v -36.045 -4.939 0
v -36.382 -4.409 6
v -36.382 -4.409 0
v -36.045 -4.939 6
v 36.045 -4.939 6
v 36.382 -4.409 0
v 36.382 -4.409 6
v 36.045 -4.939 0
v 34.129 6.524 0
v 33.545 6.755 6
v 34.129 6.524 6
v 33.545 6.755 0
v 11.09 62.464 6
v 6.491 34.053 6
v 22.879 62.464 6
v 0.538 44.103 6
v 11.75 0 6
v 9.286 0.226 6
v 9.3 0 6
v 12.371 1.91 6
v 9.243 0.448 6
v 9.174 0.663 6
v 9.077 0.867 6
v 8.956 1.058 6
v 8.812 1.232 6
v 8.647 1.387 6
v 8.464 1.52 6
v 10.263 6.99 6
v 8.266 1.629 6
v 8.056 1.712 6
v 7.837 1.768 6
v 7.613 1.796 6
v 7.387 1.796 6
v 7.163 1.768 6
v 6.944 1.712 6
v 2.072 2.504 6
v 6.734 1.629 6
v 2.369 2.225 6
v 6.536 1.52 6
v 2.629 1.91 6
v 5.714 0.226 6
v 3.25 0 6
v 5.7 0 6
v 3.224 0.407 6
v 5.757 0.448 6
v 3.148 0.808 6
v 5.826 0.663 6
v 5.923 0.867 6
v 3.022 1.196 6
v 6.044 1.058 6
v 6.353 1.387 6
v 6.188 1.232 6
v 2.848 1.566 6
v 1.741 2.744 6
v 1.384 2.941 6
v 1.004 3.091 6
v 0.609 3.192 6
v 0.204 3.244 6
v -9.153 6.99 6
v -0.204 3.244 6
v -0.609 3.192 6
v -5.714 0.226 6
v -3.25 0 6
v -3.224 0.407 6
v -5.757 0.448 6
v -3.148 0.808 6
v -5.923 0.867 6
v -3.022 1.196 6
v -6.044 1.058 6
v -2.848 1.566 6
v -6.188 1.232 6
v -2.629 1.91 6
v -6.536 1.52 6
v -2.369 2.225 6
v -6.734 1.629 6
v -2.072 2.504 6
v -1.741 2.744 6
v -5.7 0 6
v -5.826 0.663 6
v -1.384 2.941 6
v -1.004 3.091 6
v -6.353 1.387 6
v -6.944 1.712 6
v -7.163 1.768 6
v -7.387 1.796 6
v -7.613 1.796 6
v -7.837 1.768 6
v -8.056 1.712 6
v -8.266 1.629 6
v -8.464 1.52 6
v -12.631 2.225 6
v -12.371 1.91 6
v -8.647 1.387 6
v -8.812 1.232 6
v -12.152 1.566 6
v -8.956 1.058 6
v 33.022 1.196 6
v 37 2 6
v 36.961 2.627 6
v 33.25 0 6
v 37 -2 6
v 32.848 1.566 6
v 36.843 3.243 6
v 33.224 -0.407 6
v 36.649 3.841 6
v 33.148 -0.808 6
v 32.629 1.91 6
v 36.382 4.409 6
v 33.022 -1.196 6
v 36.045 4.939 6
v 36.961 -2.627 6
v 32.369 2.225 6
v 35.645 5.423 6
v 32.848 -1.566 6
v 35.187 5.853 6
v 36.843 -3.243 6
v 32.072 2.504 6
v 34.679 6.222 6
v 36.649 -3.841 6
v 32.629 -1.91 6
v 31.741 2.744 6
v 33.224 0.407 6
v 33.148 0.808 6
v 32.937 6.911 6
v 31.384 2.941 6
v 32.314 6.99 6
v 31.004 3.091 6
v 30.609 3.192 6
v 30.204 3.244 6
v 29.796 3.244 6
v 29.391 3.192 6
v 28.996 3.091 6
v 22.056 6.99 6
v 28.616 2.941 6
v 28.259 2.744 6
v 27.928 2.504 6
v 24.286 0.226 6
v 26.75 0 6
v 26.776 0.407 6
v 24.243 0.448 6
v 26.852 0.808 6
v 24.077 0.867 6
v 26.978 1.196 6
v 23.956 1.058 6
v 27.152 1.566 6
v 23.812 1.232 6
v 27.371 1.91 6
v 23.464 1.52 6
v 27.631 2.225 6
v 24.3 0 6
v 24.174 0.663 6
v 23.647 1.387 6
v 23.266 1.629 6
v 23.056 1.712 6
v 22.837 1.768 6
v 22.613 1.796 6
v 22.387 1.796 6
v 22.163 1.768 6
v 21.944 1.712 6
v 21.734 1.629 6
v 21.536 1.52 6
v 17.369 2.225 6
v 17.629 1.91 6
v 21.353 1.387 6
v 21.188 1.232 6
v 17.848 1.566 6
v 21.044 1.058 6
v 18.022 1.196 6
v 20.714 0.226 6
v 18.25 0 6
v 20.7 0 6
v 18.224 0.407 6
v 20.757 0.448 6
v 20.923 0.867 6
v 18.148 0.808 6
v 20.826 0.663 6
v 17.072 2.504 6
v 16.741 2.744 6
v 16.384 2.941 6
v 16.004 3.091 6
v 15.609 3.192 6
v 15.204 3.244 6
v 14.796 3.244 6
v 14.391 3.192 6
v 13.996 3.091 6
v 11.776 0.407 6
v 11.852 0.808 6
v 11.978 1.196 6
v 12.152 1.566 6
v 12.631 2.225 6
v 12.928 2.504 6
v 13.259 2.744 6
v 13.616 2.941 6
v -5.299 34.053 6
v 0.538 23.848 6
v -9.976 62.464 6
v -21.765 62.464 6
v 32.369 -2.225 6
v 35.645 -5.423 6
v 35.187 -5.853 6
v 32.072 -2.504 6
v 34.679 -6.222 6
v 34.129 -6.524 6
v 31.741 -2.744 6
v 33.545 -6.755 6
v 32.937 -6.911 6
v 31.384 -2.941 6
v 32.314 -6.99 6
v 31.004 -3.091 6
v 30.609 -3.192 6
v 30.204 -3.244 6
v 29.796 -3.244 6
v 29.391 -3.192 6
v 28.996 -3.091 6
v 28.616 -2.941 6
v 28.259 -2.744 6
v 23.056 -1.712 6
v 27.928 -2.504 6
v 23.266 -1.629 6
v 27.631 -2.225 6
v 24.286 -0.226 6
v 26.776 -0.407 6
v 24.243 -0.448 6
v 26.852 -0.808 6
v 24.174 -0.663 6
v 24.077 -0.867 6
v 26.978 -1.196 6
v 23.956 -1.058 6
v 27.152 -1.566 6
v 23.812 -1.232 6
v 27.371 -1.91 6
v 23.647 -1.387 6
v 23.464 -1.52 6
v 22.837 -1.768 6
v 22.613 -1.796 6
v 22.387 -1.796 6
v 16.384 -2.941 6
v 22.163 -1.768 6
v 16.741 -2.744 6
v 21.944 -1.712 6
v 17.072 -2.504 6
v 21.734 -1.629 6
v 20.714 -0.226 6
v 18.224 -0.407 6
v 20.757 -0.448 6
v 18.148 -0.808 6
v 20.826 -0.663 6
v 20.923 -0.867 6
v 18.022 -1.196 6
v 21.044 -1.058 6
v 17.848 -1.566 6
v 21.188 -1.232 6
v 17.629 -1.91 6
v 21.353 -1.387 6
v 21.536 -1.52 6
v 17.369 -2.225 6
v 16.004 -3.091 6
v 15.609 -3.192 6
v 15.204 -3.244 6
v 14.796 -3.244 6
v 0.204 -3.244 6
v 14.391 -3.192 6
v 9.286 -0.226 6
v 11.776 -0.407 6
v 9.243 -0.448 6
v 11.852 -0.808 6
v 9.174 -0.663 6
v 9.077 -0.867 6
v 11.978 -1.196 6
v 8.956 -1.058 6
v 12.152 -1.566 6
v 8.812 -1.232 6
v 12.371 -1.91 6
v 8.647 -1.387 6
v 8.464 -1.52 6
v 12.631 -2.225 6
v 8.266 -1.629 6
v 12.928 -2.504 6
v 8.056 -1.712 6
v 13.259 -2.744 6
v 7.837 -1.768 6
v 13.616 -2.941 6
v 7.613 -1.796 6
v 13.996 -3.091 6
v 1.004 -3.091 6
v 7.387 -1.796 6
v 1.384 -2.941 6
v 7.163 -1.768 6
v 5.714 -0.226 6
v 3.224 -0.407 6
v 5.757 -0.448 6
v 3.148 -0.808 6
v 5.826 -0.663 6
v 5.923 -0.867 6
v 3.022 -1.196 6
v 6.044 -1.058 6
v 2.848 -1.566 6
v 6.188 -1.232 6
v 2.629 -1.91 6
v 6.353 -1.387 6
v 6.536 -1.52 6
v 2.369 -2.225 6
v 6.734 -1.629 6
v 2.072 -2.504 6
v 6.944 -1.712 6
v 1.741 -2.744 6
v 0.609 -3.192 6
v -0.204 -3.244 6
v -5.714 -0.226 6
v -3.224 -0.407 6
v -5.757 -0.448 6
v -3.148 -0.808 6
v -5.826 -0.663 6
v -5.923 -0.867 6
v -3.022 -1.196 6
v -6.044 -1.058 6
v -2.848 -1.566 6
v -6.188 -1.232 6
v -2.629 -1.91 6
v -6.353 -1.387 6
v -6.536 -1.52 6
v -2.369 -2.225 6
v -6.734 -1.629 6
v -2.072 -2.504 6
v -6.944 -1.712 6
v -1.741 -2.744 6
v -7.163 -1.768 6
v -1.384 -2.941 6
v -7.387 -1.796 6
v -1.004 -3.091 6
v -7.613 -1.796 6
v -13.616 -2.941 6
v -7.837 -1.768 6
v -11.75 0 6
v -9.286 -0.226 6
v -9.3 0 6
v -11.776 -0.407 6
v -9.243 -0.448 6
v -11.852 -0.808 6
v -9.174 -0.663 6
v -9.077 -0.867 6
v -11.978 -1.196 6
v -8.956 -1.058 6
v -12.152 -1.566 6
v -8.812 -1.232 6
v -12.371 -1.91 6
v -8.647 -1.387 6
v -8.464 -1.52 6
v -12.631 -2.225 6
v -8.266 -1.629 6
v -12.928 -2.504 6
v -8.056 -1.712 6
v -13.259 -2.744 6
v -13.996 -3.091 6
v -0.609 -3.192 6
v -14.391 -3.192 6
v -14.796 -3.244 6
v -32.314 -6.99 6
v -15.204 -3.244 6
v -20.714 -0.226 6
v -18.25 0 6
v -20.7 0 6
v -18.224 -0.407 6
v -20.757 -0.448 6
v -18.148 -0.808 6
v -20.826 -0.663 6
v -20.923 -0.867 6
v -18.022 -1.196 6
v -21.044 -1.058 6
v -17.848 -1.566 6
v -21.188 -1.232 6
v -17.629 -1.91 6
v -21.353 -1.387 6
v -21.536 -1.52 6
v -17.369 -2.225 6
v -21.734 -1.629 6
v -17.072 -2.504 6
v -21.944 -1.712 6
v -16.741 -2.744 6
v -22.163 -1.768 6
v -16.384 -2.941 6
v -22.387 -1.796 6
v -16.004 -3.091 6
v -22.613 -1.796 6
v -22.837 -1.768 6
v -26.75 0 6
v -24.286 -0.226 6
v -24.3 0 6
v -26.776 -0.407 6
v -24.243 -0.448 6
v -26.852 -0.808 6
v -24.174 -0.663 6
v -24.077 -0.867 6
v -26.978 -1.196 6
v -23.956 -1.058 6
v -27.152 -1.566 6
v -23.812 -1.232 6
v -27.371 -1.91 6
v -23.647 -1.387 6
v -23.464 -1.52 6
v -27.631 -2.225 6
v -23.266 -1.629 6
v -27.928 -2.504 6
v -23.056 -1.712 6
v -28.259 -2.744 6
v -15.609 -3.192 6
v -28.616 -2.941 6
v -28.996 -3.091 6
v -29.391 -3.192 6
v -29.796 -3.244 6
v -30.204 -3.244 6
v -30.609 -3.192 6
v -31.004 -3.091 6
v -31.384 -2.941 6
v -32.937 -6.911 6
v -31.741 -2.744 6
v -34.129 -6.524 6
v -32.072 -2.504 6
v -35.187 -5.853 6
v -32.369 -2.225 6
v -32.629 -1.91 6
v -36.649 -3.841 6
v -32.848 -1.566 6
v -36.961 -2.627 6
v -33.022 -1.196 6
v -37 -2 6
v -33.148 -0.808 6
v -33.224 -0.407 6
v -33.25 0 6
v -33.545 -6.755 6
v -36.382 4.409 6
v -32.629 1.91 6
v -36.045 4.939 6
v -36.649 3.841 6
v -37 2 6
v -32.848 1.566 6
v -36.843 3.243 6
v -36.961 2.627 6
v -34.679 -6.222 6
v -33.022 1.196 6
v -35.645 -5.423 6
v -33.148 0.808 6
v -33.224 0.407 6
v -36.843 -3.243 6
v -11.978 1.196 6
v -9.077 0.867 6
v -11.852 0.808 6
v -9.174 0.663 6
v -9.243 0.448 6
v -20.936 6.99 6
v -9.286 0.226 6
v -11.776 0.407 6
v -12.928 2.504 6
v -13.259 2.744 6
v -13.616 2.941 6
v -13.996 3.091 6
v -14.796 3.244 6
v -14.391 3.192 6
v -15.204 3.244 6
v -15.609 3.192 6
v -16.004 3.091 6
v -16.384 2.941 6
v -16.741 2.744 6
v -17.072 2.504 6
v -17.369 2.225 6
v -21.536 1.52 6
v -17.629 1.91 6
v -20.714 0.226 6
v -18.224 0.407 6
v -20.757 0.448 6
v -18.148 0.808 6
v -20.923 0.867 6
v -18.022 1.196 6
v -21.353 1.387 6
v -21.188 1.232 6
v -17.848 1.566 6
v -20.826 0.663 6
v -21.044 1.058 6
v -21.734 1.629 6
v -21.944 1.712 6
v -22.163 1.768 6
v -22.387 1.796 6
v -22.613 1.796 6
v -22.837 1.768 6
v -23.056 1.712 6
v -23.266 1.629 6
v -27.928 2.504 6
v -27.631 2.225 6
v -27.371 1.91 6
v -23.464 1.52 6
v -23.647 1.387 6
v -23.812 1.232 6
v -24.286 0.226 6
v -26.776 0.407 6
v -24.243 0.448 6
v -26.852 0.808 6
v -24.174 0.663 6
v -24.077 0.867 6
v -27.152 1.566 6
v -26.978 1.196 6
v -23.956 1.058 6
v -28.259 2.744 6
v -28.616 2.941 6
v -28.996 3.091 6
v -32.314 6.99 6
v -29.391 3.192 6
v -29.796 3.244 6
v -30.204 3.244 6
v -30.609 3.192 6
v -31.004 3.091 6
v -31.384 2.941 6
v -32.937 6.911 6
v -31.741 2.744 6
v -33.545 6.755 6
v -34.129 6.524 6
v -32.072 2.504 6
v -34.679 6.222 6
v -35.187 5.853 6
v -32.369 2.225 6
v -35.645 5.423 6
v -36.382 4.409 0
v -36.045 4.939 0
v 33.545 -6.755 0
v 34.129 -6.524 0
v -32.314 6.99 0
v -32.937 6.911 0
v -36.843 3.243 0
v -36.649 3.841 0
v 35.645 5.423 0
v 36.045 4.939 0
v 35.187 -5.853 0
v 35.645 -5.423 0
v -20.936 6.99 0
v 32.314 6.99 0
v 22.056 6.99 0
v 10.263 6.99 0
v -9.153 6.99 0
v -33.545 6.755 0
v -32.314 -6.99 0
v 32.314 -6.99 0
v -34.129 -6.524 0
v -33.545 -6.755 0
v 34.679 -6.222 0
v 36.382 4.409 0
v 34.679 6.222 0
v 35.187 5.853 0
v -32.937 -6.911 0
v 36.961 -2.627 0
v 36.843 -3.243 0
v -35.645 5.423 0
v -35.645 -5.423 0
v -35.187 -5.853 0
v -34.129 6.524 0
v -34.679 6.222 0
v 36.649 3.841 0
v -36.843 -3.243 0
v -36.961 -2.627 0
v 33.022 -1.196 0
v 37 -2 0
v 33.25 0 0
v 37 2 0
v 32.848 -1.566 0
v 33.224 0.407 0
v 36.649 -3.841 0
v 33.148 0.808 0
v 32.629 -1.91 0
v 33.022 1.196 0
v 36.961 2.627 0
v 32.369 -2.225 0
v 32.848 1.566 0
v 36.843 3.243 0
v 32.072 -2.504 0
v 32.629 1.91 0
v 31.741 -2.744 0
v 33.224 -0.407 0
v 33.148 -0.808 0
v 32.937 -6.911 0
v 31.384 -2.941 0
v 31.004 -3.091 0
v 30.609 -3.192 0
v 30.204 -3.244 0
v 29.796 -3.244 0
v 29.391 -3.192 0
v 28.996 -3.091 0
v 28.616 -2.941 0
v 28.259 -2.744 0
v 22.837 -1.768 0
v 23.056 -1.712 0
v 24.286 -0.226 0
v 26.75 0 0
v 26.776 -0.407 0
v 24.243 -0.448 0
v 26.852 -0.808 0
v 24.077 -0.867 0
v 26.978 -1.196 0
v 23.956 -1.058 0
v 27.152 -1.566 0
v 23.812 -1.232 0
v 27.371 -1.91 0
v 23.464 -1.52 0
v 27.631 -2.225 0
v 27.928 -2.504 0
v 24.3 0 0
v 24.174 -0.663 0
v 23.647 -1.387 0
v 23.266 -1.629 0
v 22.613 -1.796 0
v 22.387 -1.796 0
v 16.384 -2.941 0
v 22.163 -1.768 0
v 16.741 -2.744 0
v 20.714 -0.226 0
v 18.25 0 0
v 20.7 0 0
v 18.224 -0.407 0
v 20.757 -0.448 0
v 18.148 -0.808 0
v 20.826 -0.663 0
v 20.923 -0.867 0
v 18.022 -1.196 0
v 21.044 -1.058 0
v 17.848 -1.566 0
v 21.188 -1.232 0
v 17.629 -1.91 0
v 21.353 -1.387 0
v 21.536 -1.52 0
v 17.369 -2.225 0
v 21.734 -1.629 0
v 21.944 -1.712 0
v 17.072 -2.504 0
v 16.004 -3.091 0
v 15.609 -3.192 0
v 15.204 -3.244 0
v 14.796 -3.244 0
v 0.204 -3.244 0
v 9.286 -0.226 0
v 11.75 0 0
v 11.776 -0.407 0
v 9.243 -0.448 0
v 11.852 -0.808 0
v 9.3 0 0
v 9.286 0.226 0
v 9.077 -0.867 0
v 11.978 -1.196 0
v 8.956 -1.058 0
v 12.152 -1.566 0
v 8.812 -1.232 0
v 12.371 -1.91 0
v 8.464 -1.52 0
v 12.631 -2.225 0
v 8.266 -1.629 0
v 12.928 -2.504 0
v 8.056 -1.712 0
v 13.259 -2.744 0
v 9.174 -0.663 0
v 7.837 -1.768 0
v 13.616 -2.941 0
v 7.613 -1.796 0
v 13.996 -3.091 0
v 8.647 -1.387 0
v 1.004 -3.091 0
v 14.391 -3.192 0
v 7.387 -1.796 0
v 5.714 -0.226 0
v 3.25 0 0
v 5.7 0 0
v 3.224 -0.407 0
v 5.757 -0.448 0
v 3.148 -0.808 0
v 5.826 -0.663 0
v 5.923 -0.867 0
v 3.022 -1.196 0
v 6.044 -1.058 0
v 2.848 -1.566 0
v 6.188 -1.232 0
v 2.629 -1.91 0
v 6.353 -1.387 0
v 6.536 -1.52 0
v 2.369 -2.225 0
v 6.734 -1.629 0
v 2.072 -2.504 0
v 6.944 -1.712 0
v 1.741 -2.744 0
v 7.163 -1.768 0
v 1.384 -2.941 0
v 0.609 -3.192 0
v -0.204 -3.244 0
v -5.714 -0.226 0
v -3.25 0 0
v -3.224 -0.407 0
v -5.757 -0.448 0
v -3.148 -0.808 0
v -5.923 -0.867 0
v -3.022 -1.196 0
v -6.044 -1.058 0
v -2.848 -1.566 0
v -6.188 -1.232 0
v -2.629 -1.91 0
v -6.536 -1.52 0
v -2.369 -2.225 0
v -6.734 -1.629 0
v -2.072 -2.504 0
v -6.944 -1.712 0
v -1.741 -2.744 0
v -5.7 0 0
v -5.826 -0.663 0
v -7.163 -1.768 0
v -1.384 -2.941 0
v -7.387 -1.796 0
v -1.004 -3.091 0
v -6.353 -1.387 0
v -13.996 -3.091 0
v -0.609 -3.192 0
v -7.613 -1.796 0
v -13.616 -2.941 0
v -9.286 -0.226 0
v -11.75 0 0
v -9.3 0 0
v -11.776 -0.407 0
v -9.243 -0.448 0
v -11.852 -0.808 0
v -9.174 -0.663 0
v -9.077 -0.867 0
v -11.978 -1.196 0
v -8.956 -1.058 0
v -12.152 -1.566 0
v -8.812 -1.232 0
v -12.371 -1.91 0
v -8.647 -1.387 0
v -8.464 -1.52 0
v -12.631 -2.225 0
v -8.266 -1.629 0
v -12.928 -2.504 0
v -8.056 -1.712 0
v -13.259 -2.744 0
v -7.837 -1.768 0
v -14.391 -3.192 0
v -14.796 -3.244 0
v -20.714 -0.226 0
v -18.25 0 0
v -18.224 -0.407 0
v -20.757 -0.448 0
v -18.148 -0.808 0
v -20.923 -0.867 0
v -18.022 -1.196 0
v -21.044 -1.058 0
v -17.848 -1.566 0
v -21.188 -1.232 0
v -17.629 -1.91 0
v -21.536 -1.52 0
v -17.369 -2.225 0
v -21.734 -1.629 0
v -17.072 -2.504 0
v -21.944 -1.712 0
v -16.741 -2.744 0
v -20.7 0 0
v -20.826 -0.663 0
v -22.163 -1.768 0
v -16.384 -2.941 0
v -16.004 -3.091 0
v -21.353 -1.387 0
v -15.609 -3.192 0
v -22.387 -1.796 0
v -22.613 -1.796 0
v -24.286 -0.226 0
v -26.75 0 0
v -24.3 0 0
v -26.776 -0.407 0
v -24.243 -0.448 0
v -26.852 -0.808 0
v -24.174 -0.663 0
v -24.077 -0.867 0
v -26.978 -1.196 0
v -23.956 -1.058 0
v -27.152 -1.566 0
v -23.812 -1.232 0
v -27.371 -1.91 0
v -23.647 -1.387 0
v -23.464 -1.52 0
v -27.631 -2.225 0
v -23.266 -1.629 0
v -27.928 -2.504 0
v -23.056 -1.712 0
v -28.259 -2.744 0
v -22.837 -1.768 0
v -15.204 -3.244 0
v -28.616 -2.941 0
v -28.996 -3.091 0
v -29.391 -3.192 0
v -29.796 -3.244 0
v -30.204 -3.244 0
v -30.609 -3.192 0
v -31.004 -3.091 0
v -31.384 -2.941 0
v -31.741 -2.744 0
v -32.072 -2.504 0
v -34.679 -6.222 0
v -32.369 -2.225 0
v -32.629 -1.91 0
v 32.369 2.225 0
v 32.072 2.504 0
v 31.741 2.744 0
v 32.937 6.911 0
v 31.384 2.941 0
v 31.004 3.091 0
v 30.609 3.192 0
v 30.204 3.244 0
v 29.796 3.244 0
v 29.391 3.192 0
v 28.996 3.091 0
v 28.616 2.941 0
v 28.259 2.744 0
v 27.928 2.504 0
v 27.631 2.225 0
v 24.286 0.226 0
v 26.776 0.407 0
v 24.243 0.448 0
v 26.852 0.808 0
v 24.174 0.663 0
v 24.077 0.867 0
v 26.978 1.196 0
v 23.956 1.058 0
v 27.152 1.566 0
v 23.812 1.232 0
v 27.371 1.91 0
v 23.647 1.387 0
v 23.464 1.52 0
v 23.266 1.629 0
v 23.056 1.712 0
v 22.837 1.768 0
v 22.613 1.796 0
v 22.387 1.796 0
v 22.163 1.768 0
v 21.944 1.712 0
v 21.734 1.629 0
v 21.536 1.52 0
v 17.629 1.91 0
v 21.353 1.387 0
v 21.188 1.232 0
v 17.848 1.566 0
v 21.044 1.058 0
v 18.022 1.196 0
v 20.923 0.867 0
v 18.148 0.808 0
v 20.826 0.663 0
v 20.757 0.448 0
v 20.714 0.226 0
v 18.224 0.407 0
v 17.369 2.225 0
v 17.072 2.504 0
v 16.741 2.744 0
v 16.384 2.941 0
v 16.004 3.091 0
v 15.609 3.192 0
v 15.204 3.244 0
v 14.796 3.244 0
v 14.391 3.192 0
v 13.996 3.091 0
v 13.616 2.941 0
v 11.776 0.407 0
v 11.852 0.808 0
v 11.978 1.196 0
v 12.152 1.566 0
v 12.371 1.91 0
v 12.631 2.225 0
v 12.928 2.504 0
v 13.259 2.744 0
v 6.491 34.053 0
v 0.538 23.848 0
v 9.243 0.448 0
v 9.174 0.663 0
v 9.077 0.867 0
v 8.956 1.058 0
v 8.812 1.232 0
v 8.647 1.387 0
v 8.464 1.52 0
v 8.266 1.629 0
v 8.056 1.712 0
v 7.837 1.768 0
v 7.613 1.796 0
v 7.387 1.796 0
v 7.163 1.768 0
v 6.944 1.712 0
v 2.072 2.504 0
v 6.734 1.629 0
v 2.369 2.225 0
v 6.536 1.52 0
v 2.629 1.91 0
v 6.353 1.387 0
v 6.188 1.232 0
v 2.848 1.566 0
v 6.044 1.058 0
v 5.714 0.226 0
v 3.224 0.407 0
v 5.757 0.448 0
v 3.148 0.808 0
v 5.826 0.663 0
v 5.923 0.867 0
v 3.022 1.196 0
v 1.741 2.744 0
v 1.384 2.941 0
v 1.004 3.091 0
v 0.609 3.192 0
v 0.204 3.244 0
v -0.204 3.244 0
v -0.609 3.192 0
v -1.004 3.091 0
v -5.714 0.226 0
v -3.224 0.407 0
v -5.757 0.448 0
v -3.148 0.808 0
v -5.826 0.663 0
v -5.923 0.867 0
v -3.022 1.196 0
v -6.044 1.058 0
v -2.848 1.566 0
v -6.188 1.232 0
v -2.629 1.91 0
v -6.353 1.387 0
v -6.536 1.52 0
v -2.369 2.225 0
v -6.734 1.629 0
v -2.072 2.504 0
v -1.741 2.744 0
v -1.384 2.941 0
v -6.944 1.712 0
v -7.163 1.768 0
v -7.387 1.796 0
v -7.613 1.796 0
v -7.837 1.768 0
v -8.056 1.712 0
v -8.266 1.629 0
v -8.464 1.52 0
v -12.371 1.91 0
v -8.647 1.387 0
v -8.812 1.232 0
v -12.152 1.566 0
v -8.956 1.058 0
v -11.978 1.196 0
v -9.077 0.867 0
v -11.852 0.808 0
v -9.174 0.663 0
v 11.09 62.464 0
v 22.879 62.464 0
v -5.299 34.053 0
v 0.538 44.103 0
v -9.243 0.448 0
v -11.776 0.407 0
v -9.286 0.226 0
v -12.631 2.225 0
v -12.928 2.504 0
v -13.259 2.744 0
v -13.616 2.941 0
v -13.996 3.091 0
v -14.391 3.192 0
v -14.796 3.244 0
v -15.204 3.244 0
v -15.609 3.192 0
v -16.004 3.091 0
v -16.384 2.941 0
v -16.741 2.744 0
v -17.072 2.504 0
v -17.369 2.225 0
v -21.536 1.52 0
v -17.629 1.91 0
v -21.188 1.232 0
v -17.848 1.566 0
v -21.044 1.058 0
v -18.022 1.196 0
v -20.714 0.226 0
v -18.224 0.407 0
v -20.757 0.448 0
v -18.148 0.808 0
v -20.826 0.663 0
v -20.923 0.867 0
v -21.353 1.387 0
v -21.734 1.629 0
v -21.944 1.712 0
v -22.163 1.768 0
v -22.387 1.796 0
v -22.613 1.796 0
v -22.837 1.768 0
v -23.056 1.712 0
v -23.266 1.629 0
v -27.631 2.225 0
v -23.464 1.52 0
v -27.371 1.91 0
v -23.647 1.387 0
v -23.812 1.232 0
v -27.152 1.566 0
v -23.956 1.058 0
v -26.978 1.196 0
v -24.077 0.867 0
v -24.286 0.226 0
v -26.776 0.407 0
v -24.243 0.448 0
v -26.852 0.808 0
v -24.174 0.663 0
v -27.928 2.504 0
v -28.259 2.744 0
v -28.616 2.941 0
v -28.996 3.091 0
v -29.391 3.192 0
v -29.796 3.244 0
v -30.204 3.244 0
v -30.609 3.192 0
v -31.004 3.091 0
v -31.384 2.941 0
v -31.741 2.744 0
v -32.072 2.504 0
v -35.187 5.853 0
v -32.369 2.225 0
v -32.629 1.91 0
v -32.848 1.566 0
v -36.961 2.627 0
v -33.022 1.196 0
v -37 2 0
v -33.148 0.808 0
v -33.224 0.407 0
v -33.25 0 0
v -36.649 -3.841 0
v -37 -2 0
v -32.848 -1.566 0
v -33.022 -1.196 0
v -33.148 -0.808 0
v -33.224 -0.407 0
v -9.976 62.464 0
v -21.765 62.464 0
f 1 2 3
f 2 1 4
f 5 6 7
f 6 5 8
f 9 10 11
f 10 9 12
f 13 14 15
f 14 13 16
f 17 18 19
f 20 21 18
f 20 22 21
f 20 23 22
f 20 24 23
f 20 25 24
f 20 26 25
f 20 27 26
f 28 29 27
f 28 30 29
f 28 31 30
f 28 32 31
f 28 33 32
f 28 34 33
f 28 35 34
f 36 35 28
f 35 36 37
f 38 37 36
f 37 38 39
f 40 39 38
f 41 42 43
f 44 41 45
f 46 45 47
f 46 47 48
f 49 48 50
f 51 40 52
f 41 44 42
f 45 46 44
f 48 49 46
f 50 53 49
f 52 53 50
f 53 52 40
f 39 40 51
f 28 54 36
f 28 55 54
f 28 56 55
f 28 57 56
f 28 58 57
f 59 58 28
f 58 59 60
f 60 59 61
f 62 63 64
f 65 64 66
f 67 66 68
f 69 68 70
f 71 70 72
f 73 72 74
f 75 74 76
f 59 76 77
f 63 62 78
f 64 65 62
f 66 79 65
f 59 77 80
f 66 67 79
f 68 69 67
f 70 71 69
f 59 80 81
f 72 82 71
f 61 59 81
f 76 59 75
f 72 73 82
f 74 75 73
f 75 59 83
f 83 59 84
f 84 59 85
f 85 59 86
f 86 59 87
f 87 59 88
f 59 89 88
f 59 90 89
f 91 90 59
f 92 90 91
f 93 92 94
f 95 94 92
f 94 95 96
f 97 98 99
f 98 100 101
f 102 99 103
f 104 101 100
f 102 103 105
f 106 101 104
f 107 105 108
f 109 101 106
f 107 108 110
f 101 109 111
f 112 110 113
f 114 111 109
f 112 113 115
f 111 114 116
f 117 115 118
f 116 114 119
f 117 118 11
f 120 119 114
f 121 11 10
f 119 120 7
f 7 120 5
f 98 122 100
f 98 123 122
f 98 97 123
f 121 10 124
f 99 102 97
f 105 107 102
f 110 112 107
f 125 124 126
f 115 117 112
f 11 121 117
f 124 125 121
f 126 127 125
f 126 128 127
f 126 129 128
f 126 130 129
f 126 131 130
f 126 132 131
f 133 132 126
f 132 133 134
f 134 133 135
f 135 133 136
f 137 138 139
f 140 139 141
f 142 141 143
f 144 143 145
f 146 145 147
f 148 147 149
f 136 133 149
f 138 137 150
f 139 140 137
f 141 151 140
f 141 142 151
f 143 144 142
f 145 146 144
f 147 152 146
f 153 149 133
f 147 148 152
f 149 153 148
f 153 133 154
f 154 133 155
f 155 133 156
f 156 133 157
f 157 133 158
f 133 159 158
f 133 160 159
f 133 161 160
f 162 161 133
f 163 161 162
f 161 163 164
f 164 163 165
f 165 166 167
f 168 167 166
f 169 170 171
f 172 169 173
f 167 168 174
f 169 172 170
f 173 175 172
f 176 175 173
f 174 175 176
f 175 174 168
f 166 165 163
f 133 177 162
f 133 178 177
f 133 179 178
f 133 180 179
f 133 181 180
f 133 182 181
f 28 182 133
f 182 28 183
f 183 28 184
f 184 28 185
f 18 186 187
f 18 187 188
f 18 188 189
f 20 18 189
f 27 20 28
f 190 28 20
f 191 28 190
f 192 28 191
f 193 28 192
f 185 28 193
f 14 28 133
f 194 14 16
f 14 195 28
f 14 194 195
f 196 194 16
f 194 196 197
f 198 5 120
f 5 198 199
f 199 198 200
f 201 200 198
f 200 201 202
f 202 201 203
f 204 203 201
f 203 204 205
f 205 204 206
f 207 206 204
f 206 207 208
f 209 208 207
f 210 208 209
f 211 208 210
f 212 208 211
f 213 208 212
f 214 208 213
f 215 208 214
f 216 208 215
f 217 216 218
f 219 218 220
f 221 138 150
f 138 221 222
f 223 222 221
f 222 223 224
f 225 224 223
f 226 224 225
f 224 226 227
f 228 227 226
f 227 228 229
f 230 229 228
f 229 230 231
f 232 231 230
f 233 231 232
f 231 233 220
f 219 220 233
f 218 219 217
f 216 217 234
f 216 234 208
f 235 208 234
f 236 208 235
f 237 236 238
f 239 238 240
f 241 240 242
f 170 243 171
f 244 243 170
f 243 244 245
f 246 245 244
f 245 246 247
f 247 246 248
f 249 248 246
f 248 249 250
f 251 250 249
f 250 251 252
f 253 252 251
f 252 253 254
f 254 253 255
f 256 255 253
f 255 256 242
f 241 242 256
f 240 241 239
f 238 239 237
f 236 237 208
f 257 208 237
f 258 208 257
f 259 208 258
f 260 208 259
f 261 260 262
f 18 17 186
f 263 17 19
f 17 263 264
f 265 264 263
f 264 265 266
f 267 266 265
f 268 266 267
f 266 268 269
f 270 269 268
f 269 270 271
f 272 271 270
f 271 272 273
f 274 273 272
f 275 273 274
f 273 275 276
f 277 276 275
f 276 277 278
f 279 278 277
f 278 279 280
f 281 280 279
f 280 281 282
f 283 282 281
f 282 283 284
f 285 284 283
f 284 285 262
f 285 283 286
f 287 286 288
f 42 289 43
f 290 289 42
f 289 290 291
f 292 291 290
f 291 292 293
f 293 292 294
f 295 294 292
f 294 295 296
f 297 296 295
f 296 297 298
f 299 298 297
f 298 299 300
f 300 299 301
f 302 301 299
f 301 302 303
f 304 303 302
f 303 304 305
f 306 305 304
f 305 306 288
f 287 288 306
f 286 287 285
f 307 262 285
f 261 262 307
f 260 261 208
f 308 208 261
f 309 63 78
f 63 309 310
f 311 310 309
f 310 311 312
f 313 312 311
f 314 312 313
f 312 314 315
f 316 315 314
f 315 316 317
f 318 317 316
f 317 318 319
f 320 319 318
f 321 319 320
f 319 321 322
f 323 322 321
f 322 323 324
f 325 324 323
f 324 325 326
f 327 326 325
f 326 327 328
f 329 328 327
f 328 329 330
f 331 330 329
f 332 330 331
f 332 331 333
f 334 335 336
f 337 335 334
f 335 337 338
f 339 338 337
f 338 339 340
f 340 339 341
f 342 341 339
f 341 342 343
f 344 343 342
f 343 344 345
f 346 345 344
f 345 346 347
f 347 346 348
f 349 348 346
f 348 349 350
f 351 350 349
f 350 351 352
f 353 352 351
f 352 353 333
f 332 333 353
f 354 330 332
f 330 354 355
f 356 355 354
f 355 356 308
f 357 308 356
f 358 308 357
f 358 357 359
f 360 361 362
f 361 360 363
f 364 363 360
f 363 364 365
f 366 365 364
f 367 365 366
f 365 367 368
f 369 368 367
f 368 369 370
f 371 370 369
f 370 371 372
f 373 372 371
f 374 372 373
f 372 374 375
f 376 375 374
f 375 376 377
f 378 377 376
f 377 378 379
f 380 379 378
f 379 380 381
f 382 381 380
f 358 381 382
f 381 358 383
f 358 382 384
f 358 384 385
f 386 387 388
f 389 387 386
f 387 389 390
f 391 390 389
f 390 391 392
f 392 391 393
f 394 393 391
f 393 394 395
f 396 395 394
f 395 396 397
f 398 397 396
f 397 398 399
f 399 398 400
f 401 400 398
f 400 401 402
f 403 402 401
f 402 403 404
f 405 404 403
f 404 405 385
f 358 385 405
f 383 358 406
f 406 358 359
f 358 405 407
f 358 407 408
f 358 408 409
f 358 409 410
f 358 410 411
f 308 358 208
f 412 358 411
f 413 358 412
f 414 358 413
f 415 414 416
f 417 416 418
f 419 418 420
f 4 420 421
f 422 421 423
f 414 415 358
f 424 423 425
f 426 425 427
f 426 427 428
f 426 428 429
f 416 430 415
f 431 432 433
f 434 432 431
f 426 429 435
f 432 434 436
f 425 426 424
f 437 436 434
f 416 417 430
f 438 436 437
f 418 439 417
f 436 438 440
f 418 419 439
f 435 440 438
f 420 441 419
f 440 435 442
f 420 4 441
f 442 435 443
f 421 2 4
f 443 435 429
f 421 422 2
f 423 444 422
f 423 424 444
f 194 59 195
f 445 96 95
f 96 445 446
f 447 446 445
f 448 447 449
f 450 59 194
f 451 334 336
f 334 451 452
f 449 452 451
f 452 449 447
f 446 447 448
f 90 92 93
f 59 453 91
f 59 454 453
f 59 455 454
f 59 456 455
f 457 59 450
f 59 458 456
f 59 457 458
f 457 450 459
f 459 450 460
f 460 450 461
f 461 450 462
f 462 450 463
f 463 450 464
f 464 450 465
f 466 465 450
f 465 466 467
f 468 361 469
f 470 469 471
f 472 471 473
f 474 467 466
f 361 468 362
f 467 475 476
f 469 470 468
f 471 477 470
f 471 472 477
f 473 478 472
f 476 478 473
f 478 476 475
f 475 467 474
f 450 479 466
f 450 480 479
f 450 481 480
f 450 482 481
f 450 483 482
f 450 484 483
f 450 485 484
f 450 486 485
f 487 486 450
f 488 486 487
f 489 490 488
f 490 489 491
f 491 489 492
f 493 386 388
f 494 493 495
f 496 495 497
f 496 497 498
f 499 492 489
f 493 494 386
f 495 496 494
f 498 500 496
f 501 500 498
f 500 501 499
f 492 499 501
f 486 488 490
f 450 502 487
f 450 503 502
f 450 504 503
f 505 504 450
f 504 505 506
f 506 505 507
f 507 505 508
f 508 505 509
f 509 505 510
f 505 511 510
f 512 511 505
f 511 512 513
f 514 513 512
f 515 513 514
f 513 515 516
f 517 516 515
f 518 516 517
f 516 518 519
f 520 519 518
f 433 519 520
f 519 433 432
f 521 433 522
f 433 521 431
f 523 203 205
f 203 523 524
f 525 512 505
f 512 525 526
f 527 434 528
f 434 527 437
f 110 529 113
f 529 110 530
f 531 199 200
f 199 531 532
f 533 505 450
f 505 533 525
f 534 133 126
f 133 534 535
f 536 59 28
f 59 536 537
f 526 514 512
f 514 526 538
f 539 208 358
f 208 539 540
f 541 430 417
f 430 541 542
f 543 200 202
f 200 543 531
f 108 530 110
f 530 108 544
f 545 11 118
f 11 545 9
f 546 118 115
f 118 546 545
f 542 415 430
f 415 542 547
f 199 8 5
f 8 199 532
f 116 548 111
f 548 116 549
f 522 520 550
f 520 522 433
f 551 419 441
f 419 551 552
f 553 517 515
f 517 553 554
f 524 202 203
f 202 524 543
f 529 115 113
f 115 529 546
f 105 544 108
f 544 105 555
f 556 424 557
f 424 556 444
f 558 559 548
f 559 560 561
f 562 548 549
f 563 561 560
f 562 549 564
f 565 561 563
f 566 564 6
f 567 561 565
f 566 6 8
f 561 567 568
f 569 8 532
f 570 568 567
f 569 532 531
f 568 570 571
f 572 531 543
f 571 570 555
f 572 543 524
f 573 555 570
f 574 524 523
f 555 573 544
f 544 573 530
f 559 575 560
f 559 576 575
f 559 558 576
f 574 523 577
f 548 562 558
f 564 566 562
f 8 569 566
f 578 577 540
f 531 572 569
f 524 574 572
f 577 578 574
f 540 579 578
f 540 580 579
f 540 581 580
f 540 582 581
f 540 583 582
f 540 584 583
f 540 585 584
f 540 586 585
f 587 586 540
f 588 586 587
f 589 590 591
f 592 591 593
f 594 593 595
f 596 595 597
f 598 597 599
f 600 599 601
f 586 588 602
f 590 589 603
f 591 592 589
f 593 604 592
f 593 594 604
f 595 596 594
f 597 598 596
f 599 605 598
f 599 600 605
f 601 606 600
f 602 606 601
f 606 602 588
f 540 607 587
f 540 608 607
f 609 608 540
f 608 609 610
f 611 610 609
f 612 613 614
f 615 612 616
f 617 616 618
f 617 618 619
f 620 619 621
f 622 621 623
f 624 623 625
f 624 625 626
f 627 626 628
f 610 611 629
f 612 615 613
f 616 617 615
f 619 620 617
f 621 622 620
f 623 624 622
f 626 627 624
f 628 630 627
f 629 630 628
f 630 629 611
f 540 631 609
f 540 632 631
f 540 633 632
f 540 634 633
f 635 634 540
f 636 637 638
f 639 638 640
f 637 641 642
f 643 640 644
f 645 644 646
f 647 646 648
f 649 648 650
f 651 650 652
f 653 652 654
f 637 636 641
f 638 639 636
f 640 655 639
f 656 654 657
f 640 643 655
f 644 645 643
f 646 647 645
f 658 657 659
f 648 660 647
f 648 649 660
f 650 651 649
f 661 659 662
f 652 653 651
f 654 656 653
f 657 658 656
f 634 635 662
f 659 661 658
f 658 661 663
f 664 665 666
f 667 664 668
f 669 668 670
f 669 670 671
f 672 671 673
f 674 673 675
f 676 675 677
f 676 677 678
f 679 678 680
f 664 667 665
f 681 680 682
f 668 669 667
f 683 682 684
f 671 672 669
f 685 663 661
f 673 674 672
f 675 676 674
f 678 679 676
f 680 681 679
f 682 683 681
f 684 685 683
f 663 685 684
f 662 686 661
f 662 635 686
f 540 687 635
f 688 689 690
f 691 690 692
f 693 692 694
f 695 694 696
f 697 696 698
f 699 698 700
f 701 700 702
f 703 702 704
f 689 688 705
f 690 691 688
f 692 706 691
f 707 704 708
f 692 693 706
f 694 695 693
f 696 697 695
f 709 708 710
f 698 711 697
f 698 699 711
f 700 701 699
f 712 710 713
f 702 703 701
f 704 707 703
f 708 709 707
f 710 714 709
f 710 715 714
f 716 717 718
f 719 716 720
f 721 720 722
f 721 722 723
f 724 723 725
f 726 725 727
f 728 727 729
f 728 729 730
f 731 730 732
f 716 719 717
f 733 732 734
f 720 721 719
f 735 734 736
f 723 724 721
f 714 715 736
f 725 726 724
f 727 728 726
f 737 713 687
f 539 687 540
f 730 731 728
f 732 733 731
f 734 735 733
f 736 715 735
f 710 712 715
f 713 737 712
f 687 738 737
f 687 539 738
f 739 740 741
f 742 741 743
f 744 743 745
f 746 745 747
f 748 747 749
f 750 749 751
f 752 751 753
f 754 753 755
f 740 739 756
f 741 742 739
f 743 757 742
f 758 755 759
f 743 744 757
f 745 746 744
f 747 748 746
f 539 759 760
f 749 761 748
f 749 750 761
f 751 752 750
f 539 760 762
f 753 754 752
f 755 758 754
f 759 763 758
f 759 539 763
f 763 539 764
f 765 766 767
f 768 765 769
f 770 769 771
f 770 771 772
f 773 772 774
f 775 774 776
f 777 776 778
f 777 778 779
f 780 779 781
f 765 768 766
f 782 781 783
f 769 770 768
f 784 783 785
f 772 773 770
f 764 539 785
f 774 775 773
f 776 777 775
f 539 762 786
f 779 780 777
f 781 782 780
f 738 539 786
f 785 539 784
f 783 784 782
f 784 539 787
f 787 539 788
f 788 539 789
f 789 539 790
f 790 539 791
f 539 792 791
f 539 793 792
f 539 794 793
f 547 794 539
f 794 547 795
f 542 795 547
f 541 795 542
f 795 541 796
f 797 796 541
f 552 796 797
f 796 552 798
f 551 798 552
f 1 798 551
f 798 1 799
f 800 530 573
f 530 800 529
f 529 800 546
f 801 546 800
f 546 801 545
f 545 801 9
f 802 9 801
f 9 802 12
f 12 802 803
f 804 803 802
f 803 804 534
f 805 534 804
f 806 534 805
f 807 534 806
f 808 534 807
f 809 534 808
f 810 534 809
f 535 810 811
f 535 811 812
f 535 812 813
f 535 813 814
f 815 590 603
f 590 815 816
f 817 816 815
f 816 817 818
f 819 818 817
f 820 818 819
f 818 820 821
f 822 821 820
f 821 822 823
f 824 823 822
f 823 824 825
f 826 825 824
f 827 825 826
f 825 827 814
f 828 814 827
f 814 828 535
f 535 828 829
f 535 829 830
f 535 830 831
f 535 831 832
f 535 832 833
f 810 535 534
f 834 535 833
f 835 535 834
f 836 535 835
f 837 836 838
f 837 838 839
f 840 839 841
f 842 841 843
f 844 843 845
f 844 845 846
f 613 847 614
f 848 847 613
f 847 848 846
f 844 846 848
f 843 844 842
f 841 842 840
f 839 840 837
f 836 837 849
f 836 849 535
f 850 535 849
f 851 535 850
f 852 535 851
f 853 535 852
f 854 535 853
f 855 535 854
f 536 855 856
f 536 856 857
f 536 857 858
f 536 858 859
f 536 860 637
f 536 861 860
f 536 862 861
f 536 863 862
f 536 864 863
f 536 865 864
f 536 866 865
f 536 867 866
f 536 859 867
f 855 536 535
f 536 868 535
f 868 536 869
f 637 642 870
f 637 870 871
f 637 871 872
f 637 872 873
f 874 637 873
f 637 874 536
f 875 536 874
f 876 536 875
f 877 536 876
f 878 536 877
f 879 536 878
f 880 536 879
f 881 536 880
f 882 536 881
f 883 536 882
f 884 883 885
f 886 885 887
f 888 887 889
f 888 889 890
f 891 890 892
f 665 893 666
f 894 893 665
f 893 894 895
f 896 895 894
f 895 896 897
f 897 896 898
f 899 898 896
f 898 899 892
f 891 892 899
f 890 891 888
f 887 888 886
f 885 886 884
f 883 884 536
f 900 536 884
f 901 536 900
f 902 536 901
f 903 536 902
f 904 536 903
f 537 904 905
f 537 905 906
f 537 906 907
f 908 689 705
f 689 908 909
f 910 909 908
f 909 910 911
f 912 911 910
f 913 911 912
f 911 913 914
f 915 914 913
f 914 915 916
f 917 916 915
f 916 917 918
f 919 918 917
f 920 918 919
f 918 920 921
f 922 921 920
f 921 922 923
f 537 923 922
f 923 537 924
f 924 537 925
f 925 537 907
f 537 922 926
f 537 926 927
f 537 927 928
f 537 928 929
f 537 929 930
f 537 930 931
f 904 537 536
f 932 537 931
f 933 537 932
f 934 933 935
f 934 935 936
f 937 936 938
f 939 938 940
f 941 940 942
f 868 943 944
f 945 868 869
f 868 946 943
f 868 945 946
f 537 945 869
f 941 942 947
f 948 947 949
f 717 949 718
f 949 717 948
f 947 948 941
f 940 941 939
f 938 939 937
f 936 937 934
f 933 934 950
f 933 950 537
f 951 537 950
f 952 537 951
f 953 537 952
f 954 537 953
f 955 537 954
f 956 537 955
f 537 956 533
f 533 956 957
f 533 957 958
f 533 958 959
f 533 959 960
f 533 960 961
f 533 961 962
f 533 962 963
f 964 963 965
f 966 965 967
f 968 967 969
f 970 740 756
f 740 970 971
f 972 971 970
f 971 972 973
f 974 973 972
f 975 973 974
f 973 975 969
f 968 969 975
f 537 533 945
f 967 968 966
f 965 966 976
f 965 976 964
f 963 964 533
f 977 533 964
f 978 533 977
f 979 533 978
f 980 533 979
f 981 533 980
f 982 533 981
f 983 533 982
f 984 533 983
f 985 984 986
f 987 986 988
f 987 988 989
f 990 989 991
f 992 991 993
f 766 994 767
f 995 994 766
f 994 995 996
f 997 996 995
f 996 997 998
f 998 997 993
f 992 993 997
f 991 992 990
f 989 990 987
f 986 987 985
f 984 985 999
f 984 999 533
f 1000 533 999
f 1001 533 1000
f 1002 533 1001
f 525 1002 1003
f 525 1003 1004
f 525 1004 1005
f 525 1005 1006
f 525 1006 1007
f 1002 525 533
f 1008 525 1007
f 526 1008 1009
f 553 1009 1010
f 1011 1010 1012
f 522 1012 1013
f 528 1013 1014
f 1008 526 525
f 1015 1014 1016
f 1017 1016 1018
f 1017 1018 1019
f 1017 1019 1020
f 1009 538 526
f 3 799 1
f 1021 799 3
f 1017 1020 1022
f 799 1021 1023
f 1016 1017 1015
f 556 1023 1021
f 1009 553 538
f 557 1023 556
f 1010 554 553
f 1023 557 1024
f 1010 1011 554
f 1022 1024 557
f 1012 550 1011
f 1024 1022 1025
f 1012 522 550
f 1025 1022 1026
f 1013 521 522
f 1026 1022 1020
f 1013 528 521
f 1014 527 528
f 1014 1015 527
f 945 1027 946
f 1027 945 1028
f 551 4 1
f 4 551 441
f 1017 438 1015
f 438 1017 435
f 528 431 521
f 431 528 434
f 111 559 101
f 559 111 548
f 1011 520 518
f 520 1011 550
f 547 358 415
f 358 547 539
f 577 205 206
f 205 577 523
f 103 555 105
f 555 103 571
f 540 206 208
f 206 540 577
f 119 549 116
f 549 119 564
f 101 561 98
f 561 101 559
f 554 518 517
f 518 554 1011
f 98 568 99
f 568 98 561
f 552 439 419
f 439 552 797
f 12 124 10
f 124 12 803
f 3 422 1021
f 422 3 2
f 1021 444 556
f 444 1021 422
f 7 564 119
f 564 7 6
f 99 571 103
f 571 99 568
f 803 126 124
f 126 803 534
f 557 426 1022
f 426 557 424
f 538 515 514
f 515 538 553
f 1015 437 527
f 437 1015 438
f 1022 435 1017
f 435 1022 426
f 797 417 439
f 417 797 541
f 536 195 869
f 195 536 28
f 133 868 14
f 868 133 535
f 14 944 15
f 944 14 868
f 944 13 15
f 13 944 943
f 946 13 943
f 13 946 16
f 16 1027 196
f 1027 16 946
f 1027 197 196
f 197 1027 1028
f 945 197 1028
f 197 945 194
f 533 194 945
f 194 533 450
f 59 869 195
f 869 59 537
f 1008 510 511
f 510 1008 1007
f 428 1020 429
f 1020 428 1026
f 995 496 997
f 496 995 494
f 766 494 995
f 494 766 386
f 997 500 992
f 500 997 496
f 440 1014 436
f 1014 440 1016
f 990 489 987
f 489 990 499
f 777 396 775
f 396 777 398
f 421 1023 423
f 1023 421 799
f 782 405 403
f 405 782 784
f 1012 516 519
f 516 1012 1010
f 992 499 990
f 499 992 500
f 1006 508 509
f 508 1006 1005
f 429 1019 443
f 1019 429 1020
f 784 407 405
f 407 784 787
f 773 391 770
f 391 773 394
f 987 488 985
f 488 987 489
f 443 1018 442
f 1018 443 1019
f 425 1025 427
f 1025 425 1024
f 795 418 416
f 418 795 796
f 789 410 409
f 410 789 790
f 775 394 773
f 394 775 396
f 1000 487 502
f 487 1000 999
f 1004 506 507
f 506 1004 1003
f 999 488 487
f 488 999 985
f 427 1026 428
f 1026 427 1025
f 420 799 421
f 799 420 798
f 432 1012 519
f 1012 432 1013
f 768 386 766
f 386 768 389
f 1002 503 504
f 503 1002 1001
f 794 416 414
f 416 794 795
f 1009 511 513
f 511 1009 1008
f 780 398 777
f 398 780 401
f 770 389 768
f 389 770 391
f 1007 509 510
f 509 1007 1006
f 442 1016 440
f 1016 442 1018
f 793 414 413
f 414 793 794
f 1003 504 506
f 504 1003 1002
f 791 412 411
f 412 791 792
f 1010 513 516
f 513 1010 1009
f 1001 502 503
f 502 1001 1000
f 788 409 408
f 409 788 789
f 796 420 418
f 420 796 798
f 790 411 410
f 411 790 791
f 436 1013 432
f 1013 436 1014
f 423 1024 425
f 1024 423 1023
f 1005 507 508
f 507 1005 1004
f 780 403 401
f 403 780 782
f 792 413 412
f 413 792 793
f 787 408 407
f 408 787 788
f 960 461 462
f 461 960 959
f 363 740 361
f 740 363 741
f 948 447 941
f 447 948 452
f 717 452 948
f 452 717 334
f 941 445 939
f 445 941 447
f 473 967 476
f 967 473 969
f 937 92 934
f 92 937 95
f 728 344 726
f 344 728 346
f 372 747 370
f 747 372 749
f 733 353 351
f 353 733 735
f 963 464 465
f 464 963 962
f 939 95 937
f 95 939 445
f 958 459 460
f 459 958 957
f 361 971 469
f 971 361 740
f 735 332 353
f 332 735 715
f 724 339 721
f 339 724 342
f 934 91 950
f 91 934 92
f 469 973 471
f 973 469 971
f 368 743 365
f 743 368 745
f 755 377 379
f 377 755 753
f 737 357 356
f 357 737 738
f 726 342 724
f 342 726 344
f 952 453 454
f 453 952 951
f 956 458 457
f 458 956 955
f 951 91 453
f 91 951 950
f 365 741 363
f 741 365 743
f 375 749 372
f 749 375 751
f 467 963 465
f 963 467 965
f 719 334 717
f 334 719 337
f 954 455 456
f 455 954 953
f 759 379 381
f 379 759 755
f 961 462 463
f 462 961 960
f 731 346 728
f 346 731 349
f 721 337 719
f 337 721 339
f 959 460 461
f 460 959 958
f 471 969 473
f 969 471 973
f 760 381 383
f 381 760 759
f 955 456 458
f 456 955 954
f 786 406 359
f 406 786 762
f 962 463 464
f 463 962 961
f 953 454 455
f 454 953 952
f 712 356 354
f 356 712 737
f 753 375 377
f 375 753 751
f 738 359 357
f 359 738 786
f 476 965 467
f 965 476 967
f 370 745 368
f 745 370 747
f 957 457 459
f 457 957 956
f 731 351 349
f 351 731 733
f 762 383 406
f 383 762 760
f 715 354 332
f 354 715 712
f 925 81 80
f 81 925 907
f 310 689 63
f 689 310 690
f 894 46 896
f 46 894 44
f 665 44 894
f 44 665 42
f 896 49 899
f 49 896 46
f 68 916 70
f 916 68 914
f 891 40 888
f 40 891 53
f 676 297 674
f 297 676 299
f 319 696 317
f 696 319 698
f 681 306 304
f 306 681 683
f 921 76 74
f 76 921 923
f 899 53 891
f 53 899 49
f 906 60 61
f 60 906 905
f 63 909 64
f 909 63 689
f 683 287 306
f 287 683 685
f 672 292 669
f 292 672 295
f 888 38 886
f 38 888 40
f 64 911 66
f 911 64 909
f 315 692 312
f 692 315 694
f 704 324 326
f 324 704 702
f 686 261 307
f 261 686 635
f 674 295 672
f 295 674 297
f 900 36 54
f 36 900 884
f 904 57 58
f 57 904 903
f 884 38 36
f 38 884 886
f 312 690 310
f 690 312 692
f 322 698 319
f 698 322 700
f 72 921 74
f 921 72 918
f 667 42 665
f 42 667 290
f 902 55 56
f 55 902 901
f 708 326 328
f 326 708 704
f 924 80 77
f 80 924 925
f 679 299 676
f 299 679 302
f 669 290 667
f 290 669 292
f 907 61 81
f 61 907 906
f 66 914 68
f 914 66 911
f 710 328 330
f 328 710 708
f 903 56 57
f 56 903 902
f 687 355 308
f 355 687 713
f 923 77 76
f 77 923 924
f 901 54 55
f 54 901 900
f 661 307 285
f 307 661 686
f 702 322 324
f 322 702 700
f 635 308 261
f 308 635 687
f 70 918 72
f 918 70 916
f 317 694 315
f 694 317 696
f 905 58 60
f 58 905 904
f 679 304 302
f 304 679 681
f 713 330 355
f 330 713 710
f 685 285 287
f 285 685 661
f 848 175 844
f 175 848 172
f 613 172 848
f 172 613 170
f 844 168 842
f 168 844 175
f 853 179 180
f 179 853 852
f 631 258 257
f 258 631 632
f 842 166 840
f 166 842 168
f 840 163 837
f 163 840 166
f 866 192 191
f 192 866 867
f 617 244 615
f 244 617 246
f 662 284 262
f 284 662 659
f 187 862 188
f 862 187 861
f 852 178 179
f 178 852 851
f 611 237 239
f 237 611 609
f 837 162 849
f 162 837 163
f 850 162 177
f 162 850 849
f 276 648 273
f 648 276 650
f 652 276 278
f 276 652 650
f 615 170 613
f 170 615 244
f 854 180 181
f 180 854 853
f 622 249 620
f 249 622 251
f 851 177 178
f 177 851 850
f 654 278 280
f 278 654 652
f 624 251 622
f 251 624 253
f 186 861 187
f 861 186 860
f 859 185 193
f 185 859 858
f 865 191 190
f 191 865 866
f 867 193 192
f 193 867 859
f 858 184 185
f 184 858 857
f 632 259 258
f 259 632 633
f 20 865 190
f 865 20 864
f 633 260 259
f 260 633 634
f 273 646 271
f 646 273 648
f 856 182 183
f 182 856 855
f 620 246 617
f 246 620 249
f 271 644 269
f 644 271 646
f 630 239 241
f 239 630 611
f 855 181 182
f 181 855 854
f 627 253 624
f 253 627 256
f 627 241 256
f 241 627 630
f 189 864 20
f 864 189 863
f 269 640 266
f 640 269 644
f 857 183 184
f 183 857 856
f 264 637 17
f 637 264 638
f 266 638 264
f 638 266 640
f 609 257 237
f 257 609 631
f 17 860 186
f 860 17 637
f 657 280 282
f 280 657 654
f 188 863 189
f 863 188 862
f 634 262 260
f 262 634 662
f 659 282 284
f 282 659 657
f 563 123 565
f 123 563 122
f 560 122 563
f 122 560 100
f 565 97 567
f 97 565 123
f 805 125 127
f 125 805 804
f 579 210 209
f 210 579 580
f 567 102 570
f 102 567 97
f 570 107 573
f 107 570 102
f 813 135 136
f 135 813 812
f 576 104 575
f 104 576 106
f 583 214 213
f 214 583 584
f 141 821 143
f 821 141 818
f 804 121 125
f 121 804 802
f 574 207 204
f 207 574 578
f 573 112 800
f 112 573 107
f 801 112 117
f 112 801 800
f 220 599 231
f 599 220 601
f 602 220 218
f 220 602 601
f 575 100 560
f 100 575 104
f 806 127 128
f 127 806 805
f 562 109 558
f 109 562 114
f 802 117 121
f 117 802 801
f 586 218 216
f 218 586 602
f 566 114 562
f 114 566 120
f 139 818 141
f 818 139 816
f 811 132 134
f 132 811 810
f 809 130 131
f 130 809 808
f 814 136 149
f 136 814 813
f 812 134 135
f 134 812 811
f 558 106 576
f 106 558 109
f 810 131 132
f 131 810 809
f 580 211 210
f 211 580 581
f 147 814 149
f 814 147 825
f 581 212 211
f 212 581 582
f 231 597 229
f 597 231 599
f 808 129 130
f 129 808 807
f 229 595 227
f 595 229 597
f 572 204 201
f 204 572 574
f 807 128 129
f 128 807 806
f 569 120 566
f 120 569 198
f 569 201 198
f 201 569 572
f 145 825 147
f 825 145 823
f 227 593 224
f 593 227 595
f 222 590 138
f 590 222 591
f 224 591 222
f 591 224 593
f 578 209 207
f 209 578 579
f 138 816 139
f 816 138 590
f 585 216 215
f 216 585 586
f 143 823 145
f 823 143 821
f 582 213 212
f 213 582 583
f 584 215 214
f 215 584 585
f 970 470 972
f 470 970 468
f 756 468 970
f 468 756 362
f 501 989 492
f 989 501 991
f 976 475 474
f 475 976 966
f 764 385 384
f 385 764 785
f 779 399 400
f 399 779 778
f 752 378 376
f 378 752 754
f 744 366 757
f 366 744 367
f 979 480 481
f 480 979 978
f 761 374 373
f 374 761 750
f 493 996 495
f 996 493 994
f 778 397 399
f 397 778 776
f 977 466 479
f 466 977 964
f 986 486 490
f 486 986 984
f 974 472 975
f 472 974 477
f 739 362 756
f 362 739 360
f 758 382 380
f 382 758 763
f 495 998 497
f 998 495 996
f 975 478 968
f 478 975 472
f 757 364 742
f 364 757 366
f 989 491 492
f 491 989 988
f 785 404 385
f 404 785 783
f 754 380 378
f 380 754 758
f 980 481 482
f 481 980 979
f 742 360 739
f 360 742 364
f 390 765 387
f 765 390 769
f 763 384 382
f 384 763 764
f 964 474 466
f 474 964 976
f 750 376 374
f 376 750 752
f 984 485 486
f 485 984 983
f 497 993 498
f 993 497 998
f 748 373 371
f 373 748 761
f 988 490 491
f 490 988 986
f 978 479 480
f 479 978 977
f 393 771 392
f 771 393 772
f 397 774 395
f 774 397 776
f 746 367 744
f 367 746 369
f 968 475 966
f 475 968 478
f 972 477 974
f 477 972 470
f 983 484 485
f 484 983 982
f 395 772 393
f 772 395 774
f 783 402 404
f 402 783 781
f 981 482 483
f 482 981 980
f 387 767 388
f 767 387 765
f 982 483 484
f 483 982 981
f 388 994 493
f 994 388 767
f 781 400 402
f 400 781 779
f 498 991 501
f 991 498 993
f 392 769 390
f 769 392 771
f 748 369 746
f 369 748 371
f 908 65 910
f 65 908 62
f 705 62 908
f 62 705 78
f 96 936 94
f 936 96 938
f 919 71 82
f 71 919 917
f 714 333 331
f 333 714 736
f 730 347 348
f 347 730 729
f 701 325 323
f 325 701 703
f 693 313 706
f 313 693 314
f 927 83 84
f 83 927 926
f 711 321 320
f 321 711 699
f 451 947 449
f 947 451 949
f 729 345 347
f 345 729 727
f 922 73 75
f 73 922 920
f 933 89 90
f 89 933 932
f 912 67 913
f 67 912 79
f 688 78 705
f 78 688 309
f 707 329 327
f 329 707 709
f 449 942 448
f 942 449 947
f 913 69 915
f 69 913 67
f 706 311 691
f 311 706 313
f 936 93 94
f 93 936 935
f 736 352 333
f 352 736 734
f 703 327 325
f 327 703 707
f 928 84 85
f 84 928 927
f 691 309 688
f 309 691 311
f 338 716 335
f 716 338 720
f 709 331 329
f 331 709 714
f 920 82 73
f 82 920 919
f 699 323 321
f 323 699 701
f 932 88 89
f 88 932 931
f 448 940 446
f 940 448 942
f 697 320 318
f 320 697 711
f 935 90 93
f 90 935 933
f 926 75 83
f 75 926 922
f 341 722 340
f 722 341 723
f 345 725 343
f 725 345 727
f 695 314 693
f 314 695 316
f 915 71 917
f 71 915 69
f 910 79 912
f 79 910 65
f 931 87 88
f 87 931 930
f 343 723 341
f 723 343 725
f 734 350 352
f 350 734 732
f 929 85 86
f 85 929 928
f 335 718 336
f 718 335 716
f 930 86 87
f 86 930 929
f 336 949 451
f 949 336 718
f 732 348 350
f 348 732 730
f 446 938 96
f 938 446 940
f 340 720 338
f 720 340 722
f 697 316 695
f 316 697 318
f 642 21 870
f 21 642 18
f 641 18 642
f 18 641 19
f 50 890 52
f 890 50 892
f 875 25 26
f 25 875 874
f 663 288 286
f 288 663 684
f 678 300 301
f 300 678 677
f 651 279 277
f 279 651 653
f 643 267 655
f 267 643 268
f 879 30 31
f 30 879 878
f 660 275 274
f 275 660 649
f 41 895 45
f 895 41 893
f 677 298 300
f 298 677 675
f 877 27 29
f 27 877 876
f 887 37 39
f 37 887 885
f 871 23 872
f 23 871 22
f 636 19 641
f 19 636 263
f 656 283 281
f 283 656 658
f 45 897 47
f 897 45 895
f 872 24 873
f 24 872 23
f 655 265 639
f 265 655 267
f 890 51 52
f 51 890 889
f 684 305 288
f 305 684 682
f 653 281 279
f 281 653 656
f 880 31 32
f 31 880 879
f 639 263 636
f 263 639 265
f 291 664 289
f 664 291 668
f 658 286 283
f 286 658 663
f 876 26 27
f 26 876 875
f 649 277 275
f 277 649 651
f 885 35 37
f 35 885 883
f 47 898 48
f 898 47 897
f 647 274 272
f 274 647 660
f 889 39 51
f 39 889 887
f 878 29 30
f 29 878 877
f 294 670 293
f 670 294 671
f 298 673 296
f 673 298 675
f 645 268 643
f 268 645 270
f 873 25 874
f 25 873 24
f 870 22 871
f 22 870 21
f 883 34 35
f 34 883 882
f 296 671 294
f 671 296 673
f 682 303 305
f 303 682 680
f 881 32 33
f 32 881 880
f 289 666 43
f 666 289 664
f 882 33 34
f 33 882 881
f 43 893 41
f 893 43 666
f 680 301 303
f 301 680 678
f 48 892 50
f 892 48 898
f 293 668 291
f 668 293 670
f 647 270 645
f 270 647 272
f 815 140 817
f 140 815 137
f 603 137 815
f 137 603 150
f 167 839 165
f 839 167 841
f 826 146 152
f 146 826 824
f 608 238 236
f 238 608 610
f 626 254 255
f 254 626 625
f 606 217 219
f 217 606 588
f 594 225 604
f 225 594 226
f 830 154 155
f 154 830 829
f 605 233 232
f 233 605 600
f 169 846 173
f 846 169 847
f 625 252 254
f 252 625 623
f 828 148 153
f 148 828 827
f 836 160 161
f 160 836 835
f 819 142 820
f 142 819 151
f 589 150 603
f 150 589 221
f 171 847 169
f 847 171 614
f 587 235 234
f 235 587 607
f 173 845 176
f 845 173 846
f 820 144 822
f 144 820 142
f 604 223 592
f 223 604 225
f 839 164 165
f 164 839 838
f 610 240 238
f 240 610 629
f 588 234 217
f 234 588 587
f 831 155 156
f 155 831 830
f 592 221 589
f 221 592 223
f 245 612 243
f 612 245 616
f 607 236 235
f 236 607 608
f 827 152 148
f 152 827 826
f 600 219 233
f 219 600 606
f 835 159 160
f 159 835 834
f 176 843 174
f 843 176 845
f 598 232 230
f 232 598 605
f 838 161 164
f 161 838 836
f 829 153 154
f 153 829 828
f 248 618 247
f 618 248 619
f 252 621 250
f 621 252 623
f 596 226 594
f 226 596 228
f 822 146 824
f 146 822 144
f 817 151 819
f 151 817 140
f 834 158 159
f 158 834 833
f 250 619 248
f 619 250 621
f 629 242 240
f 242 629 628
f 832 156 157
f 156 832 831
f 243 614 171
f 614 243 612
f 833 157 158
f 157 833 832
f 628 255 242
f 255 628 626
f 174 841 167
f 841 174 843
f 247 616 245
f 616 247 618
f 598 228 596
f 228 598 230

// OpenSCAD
$fn = 50;


difference() {
	union() {
		hull() {
			translate(v = [-32.0000000000, 2.0000000000, 0]) {
				cylinder(h = 6, r = 5);
			}
			translate(v = [32.0000000000, 2.0000000000, 0]) {
				cylinder(h = 6, r = 5);
			}
			translate(v = [-32.0000000000, -2.0000000000, 0]) {
				cylinder(h = 6, r = 5);
			}
			translate(v = [32.0000000000, -2.0000000000, 0]) {
				cylinder(h = 6, r = 5);
			}
		}
		translate(v = [0, 61.1111111111, 0]) {
			linear_extrude(height = 6) {
				text(font = "DejaVu Sans Mono:style=Bold", halign = "center", size = 57.0000000000, text = "X", valign = "top");
			}
		}
	}
	union() {
		translate(v = [-30.0000000000, 0.0000000000, 0]) {
			translate(v = [0, 0, -100]) {
				cylinder(h = 200, r = 3.2500000000);
			}
		}
		translate(v = [-15.0000000000, 0.0000000000, 0]) {
			translate(v = [0, 0, -100]) {
				cylinder(h = 200, r = 3.2500000000);
			}
		}
		translate(v = [0, 0, -100]) {
			cylinder(h = 200, r = 3.2500000000);
		}
		translate(v = [15.0000000000, 0.0000000000, 0]) {
			translate(v = [0, 0, -100]) {
				cylinder(h = 200, r = 3.2500000000);
			}
		}
		translate(v = [30.0000000000, 0.0000000000, 0]) {
			translate(v = [0, 0, -100]) {
				cylinder(h = 200, r = 3.2500000000);
			}
		}
		translate(v = [-30.0000000000, 0.0000000000, 0]) {
			translate(v = [0, 0, -100]) {
				cylinder(h = 200, r = 1.8000000000);
			}
		}
		translate(v = [-22.5000000000, 0.0000000000, 0]) {
			translate(v = [0, 0, -100]) {
				cylinder(h = 200, r = 1.8000000000);
			}
		}
		translate(v = [-15.0000000000, 0.0000000000, 0]) {
			translate(v = [0, 0, -100]) {
				cylinder(h = 200, r = 1.8000000000);
			}
		}
		translate(v = [-7.5000000000, 0.0000000000, 0]) {
			translate(v = [0, 0, -100]) {
				cylinder(h = 200, r = 1.8000000000);
			}
		}
		translate(v = [0, 0, -100]) {
			cylinder(h = 200, r = 1.8000000000);
		}
		translate(v = [7.5000000000, 0.0000000000, 0]) {
			translate(v = [0, 0, -100]) {
				cylinder(h = 200, r = 1.8000000000);
			}
		}
		translate(v = [15.0000000000, 0.0000000000, 0]) {
			translate(v = [0, 0, -100]) {
				cylinder(h = 200, r = 1.8000000000);
			}
		}
		translate(v = [22.5000000000, 0.0000000000, 0]) {
			translate(v = [0, 0, -100]) {
				cylinder(h = 200, r = 1.8000000000);
			}
		}
		translate(v = [30.0000000000, 0.0000000000, 0]) {
			translate(v = [0, 0, -100]) {
				cylinder(h = 200, r = 1.8000000000);
			}
		}
	}
}
